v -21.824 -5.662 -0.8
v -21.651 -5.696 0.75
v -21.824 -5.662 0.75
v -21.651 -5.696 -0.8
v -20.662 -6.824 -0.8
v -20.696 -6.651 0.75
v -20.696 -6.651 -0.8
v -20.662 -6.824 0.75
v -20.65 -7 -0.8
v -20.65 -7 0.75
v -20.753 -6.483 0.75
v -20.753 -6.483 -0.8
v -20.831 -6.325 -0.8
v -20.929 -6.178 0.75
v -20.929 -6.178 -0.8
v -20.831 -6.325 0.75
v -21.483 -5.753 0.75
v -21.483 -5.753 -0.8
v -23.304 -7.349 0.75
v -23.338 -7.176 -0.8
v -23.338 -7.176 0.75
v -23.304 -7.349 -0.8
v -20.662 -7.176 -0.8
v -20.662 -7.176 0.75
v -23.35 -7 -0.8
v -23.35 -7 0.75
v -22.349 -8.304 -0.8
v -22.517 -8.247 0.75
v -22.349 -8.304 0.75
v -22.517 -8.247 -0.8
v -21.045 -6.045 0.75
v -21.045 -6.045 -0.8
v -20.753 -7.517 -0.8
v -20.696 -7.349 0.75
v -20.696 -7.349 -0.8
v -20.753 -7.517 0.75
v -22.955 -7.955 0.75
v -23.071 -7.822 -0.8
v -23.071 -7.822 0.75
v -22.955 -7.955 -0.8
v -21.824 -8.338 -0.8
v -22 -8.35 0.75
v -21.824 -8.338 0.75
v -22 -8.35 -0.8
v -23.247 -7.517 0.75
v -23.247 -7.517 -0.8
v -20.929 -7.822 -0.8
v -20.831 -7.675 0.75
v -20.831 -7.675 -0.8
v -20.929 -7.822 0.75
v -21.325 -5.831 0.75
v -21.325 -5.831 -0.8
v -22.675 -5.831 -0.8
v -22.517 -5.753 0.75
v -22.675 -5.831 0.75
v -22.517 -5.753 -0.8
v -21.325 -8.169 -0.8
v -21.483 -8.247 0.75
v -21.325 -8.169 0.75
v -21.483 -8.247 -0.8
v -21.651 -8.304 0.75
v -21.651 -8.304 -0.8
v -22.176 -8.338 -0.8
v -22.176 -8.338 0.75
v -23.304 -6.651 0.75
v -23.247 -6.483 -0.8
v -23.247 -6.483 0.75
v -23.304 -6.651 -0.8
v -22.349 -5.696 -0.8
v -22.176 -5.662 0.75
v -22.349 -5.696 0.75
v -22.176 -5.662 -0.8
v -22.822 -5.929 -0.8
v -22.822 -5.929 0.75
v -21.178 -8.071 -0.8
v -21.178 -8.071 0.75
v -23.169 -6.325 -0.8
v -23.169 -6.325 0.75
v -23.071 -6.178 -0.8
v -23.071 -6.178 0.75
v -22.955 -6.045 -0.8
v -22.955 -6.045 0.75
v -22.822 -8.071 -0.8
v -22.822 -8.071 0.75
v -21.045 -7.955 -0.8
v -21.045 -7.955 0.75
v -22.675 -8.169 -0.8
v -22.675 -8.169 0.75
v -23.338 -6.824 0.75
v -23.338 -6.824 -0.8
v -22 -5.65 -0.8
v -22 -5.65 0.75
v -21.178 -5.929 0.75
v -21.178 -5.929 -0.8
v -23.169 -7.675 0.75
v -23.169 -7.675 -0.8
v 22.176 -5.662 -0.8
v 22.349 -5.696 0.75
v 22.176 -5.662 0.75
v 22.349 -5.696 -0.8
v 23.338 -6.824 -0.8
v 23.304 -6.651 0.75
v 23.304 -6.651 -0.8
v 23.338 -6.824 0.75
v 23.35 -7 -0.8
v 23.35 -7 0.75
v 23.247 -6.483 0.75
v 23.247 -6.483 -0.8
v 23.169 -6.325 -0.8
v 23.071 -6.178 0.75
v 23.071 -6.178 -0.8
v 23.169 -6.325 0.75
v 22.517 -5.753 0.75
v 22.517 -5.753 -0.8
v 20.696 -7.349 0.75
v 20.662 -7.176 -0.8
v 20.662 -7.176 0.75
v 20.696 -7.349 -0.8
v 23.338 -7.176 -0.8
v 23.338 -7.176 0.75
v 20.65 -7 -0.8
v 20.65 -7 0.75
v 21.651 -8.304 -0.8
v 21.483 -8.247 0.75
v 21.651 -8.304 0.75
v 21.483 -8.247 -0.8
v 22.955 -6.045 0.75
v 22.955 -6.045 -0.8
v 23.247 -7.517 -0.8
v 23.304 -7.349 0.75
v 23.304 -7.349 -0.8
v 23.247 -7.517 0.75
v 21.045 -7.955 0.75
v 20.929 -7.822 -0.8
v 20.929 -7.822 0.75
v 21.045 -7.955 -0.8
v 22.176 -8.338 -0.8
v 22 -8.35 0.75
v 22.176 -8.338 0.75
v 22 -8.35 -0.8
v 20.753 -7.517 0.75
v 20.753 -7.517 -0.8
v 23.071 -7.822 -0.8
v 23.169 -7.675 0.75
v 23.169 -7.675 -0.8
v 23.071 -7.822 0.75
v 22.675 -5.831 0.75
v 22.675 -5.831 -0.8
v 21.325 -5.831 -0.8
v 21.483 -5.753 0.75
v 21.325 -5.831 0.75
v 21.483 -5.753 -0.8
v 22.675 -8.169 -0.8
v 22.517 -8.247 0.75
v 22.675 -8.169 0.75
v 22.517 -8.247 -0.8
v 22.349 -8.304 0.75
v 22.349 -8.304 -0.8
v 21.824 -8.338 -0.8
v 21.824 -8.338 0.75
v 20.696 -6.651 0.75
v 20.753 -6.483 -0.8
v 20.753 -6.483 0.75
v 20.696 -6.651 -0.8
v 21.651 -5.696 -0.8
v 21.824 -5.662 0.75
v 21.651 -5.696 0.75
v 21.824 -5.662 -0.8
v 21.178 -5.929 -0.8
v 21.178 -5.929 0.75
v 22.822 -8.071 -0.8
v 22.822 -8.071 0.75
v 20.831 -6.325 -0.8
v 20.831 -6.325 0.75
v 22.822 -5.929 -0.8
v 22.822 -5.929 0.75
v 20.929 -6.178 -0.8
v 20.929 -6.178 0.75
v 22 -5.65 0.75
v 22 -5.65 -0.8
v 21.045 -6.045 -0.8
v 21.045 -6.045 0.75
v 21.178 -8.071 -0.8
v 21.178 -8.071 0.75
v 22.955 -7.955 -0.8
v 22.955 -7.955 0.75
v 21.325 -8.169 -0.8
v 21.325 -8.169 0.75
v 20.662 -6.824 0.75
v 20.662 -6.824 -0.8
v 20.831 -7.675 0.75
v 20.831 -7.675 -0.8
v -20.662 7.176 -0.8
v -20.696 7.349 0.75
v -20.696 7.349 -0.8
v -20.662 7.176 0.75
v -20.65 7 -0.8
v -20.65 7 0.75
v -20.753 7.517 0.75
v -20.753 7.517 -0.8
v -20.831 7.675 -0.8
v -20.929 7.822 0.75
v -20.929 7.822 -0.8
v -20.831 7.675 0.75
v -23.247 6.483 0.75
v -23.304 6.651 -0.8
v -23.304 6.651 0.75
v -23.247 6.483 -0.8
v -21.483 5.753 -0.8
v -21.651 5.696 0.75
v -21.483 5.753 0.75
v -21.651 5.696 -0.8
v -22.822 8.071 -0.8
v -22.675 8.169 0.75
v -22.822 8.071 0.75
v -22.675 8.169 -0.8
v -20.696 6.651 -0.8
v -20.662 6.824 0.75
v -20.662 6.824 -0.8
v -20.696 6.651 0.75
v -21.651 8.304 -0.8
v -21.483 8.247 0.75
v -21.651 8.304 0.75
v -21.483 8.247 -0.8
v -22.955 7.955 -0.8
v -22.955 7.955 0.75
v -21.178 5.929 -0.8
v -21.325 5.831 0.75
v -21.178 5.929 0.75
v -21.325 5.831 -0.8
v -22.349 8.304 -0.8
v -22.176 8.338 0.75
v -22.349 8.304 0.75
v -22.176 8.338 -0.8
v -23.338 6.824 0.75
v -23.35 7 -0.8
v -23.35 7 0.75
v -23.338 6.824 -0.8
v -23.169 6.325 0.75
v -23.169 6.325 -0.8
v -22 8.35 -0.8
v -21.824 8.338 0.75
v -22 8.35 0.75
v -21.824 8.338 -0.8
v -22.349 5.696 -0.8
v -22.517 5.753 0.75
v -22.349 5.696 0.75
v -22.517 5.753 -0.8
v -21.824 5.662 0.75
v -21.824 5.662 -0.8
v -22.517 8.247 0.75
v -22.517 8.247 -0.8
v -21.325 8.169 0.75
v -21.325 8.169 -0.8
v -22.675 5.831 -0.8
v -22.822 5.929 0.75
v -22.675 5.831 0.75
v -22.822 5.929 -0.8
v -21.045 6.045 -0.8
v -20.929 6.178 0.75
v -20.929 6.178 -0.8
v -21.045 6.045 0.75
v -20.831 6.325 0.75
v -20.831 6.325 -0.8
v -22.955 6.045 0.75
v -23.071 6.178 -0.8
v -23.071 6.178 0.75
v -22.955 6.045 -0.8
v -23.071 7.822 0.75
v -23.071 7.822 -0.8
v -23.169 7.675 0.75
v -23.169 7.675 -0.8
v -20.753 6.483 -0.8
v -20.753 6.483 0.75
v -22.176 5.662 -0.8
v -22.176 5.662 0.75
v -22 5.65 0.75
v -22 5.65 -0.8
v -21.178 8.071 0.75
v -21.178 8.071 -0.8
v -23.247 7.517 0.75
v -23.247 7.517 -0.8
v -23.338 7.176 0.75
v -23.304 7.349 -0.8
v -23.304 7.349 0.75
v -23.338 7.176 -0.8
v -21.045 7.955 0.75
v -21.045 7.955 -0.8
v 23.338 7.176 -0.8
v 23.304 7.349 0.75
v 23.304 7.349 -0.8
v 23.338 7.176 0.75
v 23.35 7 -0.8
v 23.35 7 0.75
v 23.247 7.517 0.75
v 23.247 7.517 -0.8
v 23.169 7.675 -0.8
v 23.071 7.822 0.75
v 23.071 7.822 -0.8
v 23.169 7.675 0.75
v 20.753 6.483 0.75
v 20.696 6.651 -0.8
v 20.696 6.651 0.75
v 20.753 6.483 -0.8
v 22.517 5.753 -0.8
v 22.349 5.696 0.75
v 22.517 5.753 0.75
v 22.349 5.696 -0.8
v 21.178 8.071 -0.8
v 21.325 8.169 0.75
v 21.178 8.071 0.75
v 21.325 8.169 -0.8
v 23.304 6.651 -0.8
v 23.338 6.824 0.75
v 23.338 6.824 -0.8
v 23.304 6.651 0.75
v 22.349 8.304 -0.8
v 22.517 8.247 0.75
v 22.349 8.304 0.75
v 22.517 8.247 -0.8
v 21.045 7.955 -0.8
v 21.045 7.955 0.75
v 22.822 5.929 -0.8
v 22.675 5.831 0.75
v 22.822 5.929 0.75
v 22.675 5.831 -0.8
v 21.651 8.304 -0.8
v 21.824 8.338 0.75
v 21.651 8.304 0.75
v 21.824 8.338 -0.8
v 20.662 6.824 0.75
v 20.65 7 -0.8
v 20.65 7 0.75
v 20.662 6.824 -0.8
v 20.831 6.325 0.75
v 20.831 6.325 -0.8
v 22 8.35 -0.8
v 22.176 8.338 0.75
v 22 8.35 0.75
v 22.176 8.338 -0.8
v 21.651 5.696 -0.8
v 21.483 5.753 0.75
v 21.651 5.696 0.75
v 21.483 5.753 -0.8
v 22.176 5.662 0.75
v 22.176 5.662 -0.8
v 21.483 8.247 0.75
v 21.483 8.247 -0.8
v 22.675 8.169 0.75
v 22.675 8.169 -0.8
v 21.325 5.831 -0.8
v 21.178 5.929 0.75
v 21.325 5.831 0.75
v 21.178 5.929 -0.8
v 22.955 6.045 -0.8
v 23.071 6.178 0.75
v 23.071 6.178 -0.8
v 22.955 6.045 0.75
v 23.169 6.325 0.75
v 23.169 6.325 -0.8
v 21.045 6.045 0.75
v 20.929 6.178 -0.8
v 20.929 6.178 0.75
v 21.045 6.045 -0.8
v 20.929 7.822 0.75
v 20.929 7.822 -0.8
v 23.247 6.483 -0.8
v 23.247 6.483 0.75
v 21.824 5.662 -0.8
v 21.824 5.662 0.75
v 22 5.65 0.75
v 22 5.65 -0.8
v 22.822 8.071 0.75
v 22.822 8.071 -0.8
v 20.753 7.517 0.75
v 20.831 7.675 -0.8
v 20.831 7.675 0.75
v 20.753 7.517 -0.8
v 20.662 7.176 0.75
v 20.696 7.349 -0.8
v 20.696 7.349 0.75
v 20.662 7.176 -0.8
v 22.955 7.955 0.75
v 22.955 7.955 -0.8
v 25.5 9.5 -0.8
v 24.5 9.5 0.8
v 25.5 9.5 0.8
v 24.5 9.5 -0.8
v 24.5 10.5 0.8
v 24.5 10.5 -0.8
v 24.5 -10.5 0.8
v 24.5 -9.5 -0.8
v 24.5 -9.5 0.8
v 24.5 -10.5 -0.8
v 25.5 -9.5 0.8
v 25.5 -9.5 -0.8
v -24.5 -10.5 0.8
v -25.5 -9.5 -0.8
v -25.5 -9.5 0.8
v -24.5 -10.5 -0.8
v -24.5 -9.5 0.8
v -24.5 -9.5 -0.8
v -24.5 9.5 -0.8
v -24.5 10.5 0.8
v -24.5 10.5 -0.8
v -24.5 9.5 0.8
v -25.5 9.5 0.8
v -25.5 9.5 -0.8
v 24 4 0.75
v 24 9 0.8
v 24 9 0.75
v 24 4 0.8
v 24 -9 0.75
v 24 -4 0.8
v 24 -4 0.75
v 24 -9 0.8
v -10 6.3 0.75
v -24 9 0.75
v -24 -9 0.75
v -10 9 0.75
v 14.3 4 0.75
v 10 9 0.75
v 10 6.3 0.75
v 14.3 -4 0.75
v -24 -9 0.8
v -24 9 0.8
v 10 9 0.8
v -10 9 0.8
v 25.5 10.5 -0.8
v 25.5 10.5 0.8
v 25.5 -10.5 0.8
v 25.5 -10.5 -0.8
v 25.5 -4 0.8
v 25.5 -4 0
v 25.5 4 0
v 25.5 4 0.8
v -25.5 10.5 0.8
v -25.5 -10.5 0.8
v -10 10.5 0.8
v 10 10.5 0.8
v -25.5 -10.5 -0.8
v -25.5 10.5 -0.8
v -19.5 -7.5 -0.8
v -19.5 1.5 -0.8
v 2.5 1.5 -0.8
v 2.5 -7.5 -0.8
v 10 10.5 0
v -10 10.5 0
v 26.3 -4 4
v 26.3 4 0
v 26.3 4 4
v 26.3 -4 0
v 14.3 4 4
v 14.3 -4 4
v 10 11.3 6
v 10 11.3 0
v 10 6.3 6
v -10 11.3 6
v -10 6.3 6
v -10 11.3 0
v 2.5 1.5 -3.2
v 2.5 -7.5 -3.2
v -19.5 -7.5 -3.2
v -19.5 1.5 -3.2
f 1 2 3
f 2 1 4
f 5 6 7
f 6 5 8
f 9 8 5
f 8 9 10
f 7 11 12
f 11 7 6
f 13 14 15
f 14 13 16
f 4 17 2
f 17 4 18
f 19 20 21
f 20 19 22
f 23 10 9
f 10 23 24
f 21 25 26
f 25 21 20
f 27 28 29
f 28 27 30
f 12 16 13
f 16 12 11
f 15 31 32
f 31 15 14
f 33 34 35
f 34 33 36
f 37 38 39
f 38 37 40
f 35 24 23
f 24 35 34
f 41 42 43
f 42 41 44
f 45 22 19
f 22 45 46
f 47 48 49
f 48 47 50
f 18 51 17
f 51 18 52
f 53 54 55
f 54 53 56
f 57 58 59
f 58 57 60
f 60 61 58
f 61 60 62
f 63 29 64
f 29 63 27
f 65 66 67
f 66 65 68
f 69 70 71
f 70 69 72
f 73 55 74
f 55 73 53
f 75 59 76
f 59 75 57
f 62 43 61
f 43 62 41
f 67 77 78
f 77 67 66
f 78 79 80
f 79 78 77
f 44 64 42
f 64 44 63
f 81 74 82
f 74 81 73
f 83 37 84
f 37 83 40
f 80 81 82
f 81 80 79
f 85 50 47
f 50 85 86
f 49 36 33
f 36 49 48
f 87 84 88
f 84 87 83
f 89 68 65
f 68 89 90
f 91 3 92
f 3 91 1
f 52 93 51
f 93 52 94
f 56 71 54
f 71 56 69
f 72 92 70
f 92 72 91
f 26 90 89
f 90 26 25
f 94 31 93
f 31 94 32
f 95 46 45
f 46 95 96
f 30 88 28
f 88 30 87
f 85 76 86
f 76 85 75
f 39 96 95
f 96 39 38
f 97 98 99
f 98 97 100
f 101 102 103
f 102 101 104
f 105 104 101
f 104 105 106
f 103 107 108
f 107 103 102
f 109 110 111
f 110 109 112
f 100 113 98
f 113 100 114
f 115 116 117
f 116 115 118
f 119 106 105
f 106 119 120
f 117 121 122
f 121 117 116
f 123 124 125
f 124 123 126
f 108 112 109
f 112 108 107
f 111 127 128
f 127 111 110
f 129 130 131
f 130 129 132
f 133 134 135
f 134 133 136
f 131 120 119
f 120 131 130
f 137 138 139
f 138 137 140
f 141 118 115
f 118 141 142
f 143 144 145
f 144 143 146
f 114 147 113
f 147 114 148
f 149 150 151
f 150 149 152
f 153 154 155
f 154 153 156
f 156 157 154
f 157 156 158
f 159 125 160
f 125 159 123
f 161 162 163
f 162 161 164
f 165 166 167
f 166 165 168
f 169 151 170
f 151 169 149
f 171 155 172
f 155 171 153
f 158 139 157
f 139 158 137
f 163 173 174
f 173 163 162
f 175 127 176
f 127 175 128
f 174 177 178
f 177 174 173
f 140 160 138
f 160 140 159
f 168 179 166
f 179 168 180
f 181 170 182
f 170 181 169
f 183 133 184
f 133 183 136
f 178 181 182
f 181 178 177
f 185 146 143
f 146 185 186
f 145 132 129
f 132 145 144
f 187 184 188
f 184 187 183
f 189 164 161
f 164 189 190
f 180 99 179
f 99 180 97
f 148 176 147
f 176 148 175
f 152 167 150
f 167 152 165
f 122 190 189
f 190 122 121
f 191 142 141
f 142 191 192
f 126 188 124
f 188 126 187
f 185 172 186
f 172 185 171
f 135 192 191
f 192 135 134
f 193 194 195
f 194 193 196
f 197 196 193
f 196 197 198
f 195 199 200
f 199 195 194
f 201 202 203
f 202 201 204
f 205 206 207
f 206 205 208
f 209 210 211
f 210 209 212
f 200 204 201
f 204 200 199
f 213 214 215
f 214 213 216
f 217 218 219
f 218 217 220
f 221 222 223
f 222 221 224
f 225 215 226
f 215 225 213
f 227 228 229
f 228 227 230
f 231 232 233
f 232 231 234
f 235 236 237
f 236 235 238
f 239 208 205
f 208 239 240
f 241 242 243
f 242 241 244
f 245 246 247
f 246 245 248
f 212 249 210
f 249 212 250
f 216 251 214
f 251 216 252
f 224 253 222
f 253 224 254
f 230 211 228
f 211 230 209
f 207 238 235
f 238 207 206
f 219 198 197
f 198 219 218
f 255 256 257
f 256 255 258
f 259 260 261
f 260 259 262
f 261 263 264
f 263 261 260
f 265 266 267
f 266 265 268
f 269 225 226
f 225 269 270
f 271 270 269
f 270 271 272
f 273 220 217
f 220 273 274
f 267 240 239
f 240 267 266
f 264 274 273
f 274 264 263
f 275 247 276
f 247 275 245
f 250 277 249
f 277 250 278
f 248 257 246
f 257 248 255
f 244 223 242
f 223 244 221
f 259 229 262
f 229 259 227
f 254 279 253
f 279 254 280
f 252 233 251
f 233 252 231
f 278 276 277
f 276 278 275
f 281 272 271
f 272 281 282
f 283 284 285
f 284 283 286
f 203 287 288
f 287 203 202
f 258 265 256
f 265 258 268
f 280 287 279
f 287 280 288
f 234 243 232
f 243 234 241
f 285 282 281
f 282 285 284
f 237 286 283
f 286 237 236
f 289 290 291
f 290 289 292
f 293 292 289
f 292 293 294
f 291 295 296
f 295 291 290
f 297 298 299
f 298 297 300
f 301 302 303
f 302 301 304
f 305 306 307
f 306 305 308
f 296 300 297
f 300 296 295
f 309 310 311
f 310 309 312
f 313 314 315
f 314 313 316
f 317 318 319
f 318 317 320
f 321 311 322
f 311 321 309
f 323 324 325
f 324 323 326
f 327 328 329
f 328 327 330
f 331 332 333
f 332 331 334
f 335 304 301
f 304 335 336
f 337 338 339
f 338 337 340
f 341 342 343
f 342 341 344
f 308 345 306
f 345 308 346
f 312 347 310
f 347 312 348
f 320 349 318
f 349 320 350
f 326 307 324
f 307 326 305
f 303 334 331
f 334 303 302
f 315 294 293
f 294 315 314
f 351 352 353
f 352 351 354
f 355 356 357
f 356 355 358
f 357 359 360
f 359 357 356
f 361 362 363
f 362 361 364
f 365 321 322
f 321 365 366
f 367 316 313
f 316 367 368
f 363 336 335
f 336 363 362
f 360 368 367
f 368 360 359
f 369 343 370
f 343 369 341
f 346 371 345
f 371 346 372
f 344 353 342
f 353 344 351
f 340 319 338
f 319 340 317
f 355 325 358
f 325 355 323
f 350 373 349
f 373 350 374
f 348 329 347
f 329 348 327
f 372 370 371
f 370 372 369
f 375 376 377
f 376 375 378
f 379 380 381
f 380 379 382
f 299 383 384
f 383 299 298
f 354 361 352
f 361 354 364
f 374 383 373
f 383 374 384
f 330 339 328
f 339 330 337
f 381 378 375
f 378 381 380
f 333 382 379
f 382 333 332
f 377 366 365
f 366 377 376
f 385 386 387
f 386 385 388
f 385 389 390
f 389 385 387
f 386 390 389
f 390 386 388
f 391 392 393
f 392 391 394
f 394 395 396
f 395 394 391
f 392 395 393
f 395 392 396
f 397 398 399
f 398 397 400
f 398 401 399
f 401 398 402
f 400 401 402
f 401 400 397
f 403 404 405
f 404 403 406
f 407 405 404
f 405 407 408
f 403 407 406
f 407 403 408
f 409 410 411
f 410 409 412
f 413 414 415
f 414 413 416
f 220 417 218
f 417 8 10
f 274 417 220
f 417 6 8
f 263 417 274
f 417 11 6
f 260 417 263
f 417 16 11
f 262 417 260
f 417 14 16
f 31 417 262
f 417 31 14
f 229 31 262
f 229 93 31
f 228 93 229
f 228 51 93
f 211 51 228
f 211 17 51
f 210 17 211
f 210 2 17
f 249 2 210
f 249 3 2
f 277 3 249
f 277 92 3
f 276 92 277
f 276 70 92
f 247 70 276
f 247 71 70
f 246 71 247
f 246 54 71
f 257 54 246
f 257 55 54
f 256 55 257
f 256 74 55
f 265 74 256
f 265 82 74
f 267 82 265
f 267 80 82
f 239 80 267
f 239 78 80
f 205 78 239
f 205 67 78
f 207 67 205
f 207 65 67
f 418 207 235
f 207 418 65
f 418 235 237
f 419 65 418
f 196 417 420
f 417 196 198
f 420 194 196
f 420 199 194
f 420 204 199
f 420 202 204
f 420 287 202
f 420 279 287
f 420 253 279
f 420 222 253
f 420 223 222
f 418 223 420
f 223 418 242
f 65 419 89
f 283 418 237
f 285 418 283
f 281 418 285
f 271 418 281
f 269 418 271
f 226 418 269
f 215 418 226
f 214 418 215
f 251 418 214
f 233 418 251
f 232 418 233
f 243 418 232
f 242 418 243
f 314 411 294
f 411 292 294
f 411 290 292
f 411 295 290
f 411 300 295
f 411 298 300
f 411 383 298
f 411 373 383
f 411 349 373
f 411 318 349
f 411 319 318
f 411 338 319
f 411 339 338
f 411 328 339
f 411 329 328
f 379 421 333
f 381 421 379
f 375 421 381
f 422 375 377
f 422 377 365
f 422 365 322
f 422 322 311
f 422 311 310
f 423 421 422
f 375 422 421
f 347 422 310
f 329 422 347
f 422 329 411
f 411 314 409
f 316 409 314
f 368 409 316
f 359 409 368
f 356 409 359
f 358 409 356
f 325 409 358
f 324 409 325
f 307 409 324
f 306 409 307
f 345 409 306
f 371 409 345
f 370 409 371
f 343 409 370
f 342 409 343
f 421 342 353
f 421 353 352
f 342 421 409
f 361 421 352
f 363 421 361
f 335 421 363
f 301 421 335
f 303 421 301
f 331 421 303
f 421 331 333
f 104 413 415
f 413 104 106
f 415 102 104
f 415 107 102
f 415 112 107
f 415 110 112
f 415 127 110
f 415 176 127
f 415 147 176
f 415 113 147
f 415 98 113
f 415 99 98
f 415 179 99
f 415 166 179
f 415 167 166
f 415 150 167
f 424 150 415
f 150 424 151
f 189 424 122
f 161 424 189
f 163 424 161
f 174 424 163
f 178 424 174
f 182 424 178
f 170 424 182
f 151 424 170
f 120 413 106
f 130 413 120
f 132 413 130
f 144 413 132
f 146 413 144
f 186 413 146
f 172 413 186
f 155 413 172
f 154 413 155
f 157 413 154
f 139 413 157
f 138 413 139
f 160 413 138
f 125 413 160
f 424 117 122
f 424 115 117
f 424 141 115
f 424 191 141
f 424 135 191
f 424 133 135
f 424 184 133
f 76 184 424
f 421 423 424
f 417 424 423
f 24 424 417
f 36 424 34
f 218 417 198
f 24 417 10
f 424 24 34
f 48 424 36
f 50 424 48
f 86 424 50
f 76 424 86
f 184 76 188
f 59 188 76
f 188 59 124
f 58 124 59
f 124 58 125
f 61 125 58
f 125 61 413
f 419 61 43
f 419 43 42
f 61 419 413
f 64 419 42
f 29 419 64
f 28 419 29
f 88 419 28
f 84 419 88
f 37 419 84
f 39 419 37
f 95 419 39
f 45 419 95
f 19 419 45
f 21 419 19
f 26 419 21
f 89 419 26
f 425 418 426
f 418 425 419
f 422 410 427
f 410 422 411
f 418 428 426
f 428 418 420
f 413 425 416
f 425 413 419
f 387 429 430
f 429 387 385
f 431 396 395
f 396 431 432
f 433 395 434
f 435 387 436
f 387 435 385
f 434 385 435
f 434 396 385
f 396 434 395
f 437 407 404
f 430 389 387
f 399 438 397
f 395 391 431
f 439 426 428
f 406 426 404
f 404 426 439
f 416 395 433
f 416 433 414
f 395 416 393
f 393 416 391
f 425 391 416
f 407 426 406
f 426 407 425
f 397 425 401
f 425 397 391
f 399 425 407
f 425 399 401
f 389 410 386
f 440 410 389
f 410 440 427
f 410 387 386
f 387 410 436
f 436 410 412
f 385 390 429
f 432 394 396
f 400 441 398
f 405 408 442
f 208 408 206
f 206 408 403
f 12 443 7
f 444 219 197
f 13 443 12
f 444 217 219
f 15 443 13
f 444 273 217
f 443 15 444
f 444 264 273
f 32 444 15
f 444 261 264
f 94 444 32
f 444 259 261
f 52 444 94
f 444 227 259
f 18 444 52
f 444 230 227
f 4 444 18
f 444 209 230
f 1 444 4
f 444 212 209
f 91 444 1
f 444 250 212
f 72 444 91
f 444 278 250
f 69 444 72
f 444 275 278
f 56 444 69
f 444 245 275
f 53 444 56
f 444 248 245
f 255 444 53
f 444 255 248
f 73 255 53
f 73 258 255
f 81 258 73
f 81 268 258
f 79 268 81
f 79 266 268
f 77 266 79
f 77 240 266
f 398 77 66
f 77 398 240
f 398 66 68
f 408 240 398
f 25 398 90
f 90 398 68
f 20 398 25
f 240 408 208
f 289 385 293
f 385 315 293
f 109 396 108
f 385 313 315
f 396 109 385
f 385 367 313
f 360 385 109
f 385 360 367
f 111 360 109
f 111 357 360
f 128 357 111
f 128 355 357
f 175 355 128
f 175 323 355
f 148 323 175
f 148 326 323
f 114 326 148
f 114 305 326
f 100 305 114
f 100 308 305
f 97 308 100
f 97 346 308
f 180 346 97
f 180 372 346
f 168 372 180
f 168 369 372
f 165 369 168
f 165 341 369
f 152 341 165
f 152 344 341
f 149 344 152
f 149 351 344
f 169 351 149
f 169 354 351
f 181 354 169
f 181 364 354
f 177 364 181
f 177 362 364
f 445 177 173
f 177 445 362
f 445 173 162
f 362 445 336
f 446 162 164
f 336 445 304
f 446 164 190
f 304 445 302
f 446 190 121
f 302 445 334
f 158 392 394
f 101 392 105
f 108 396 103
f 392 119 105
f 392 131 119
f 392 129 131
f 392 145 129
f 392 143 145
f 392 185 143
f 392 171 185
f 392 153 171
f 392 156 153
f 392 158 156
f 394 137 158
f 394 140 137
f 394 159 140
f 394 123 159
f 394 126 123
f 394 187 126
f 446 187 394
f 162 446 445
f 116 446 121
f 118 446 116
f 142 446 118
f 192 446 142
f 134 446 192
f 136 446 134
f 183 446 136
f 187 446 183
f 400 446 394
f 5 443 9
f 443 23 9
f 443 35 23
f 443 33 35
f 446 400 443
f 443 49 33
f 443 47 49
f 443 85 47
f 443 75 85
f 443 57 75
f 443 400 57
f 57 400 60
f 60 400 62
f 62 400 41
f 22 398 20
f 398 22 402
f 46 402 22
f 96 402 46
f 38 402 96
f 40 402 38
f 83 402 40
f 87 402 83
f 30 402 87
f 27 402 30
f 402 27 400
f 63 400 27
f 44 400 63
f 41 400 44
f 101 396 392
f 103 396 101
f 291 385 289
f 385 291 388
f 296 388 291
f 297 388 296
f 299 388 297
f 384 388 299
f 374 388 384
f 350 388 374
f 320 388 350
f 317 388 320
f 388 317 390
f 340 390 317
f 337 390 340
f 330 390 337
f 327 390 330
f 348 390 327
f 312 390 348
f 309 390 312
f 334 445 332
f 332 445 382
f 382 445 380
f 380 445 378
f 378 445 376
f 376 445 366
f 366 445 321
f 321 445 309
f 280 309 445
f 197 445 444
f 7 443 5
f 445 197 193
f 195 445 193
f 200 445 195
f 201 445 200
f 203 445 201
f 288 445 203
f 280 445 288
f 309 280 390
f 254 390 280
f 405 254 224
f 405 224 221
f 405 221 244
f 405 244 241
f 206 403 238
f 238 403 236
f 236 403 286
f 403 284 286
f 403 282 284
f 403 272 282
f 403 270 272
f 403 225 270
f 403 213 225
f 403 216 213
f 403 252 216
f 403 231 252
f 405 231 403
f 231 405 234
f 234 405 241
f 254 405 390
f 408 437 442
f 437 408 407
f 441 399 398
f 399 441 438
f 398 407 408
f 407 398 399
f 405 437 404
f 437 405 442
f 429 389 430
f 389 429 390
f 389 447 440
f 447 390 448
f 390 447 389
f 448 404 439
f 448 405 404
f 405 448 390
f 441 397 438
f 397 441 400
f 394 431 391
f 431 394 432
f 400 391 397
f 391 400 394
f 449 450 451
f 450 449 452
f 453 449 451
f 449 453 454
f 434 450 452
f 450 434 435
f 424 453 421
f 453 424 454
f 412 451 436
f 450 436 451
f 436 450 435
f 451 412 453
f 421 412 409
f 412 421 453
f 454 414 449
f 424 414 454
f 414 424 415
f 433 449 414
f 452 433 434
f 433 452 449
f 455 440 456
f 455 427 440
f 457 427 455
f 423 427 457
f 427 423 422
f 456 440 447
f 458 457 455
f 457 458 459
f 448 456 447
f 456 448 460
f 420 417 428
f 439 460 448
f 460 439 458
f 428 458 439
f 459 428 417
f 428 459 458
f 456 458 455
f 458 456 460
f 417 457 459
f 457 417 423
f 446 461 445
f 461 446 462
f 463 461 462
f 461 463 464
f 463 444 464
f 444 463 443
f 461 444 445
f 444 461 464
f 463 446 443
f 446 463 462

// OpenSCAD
// Single-board computer (SBC) - 51.0mm x 21.0mm x 1.6mm
// One connected solid (no floating parts). No text/labels.

// ---------- Parameters ----------
pcb_L = 51.0;                 // length (X)
pcb_W = 21.0;                 // width  (Y)
pcb_T = 1.6;                  // thickness (Z)

hole_d = 2.7;
hole_edge_margin = 3.5;

chamfer_size = 1.0;

// Keep silkscreen as a shallow recess (doesn't break connectivity)
silk_depth = 0.05;
silk_margin = 1.5;
silk_line_w = 0.6;

// Connector placeholders (kept as solid blocks attached to PCB)
conn_usb_L = 12.0;
conn_usb_W = 8.0;
conn_usb_H = 4.0;

conn_header_L = 20.0;
conn_header_W = 5.0;
conn_header_H = 6.0;

// Small overlap to guarantee manifold union
conn_overlap = 0.8;

// Visual only
pcb_color = [0.0, 0.4, 0.2];
part_color = [0.2, 0.35, 0.55];

// ---------- Helpers ----------
module pcb_main_board() {
  color(pcb_color)
    cube([pcb_L, pcb_W, pcb_T], center=true);
}

module mount_hole_cyl(x, y) {
  translate([x, y, 0])
    cylinder(h=pcb_T*4, r=hole_d/2, center=true, $fn=48);
}

// Corner chamfer as a 45-degree wedge removed from each corner
module chamfer_wedge_at_corner(sx, sy) {
  // sx, sy are +/-1 selecting which corner
  // Place wedge so it removes material at the corner.
  translate([sx*(pcb_L/2 - chamfer_size), sy*(pcb_W/2 - chamfer_size), 0])
    rotate([0, 0, (sx==1 && sy==1) ? 0 :
                  (sx==1 && sy==-1) ? -90 :
                  (sx==-1 && sy==-1) ? 180 : 90])
      linear_extrude(height=pcb_T*4, center=true)
        polygon(points=[[0,0],[chamfer_size,0],[0,chamfer_size]]);
}

module silkscreen_recesses() {
  // A shallow recess on the top face; kept small so it doesn't cause render issues.
  translate([0, 0, pcb_T/2 - silk_depth/2]) {
    cube([pcb_L - 2*silk_margin, pcb_W - 2*silk_margin, silk_depth], center=true);
    cube([pcb_L - 2*silk_margin, silk_line_w, silk_depth], center=true);
    cube([silk_line_w, pcb_W - 2*silk_margin, silk_depth], center=true);
  }
}

// ---------- PCB operations ----------
module mounting_holes() {
  union() {
    mount_hole_cyl(-pcb_L/2 + hole_edge_margin, -pcb_W/2 + hole_edge_margin);
    mount_hole_cyl( pcb_L/2 - hole_edge_margin, -pcb_W/2 + hole_edge_margin);
    mount_hole_cyl(-pcb_L/2 + hole_edge_margin,  pcb_W/2 - hole_edge_margin);
    mount_hole_cyl( pcb_L/2 - hole_edge_margin,  pcb_W/2 - hole_edge_margin);
  }
}

module edge_chamfers() {
  union() {
    chamfer_wedge_at_corner( 1,  1);
    chamfer_wedge_at_corner( 1, -1);
    chamfer_wedge_at_corner(-1, -1);
    chamfer_wedge_at_corner(-1,  1);
  }
}

module pcb_with_features() {
  difference() {
    pcb_main_board();
    mounting_holes();
    edge_chamfers();
    silkscreen_recesses();
  }
}

// ---------- Components (connected to PCB) ----------
module conn_usb_placeholder() {
  // Attached on +X edge, centered in Y, sitting on top of PCB with overlap
  translate([
      pcb_L/2 - conn_usb_L/2 + conn_overlap,
      0,
      pcb_T/2 + conn_usb_H/2 - conn_overlap
    ])
    color(part_color)
      cube([conn_usb_L, conn_usb_W, conn_usb_H], center=true);
}

module conn_header_placeholder() {
  // Attached on +Y edge, centered in X, sitting on top of PCB with overlap
  translate([
      0,
      pcb_W/2 - conn_header_W/2 + conn_overlap,
      pcb_T/2 + conn_header_H/2 - conn_overlap
    ])
    color(part_color)
      cube([conn_header_L, conn_header_W, conn_header_H], center=true);
}

// Optional underside module to better resemble SBC while staying connected
module underside_module() {
  // A low-profile block on the bottom, attached with overlap
  mod_L = 22;
  mod_W = 9;
  mod_H = 3.2;
  translate([
      -pcb_L/2 + mod_L/2 + 6,                 // formula-based offset from edge
      -pcb_W/2 + mod_W/2 + 3,                 // formula-based offset from edge
      -pcb_T/2 - mod_H/2 + conn_overlap       // overlap into PCB
    ])
    color(part_color)
      cube([mod_L, mod_W, mod_H], center=true);
}

// ---------- Final Model (ONE connected solid) ----------
module complete_model() {
  union() {
    pcb_with_features();
    conn_usb_placeholder();
    conn_header_placeholder();
    underside_module();
  }
}

complete_model();
